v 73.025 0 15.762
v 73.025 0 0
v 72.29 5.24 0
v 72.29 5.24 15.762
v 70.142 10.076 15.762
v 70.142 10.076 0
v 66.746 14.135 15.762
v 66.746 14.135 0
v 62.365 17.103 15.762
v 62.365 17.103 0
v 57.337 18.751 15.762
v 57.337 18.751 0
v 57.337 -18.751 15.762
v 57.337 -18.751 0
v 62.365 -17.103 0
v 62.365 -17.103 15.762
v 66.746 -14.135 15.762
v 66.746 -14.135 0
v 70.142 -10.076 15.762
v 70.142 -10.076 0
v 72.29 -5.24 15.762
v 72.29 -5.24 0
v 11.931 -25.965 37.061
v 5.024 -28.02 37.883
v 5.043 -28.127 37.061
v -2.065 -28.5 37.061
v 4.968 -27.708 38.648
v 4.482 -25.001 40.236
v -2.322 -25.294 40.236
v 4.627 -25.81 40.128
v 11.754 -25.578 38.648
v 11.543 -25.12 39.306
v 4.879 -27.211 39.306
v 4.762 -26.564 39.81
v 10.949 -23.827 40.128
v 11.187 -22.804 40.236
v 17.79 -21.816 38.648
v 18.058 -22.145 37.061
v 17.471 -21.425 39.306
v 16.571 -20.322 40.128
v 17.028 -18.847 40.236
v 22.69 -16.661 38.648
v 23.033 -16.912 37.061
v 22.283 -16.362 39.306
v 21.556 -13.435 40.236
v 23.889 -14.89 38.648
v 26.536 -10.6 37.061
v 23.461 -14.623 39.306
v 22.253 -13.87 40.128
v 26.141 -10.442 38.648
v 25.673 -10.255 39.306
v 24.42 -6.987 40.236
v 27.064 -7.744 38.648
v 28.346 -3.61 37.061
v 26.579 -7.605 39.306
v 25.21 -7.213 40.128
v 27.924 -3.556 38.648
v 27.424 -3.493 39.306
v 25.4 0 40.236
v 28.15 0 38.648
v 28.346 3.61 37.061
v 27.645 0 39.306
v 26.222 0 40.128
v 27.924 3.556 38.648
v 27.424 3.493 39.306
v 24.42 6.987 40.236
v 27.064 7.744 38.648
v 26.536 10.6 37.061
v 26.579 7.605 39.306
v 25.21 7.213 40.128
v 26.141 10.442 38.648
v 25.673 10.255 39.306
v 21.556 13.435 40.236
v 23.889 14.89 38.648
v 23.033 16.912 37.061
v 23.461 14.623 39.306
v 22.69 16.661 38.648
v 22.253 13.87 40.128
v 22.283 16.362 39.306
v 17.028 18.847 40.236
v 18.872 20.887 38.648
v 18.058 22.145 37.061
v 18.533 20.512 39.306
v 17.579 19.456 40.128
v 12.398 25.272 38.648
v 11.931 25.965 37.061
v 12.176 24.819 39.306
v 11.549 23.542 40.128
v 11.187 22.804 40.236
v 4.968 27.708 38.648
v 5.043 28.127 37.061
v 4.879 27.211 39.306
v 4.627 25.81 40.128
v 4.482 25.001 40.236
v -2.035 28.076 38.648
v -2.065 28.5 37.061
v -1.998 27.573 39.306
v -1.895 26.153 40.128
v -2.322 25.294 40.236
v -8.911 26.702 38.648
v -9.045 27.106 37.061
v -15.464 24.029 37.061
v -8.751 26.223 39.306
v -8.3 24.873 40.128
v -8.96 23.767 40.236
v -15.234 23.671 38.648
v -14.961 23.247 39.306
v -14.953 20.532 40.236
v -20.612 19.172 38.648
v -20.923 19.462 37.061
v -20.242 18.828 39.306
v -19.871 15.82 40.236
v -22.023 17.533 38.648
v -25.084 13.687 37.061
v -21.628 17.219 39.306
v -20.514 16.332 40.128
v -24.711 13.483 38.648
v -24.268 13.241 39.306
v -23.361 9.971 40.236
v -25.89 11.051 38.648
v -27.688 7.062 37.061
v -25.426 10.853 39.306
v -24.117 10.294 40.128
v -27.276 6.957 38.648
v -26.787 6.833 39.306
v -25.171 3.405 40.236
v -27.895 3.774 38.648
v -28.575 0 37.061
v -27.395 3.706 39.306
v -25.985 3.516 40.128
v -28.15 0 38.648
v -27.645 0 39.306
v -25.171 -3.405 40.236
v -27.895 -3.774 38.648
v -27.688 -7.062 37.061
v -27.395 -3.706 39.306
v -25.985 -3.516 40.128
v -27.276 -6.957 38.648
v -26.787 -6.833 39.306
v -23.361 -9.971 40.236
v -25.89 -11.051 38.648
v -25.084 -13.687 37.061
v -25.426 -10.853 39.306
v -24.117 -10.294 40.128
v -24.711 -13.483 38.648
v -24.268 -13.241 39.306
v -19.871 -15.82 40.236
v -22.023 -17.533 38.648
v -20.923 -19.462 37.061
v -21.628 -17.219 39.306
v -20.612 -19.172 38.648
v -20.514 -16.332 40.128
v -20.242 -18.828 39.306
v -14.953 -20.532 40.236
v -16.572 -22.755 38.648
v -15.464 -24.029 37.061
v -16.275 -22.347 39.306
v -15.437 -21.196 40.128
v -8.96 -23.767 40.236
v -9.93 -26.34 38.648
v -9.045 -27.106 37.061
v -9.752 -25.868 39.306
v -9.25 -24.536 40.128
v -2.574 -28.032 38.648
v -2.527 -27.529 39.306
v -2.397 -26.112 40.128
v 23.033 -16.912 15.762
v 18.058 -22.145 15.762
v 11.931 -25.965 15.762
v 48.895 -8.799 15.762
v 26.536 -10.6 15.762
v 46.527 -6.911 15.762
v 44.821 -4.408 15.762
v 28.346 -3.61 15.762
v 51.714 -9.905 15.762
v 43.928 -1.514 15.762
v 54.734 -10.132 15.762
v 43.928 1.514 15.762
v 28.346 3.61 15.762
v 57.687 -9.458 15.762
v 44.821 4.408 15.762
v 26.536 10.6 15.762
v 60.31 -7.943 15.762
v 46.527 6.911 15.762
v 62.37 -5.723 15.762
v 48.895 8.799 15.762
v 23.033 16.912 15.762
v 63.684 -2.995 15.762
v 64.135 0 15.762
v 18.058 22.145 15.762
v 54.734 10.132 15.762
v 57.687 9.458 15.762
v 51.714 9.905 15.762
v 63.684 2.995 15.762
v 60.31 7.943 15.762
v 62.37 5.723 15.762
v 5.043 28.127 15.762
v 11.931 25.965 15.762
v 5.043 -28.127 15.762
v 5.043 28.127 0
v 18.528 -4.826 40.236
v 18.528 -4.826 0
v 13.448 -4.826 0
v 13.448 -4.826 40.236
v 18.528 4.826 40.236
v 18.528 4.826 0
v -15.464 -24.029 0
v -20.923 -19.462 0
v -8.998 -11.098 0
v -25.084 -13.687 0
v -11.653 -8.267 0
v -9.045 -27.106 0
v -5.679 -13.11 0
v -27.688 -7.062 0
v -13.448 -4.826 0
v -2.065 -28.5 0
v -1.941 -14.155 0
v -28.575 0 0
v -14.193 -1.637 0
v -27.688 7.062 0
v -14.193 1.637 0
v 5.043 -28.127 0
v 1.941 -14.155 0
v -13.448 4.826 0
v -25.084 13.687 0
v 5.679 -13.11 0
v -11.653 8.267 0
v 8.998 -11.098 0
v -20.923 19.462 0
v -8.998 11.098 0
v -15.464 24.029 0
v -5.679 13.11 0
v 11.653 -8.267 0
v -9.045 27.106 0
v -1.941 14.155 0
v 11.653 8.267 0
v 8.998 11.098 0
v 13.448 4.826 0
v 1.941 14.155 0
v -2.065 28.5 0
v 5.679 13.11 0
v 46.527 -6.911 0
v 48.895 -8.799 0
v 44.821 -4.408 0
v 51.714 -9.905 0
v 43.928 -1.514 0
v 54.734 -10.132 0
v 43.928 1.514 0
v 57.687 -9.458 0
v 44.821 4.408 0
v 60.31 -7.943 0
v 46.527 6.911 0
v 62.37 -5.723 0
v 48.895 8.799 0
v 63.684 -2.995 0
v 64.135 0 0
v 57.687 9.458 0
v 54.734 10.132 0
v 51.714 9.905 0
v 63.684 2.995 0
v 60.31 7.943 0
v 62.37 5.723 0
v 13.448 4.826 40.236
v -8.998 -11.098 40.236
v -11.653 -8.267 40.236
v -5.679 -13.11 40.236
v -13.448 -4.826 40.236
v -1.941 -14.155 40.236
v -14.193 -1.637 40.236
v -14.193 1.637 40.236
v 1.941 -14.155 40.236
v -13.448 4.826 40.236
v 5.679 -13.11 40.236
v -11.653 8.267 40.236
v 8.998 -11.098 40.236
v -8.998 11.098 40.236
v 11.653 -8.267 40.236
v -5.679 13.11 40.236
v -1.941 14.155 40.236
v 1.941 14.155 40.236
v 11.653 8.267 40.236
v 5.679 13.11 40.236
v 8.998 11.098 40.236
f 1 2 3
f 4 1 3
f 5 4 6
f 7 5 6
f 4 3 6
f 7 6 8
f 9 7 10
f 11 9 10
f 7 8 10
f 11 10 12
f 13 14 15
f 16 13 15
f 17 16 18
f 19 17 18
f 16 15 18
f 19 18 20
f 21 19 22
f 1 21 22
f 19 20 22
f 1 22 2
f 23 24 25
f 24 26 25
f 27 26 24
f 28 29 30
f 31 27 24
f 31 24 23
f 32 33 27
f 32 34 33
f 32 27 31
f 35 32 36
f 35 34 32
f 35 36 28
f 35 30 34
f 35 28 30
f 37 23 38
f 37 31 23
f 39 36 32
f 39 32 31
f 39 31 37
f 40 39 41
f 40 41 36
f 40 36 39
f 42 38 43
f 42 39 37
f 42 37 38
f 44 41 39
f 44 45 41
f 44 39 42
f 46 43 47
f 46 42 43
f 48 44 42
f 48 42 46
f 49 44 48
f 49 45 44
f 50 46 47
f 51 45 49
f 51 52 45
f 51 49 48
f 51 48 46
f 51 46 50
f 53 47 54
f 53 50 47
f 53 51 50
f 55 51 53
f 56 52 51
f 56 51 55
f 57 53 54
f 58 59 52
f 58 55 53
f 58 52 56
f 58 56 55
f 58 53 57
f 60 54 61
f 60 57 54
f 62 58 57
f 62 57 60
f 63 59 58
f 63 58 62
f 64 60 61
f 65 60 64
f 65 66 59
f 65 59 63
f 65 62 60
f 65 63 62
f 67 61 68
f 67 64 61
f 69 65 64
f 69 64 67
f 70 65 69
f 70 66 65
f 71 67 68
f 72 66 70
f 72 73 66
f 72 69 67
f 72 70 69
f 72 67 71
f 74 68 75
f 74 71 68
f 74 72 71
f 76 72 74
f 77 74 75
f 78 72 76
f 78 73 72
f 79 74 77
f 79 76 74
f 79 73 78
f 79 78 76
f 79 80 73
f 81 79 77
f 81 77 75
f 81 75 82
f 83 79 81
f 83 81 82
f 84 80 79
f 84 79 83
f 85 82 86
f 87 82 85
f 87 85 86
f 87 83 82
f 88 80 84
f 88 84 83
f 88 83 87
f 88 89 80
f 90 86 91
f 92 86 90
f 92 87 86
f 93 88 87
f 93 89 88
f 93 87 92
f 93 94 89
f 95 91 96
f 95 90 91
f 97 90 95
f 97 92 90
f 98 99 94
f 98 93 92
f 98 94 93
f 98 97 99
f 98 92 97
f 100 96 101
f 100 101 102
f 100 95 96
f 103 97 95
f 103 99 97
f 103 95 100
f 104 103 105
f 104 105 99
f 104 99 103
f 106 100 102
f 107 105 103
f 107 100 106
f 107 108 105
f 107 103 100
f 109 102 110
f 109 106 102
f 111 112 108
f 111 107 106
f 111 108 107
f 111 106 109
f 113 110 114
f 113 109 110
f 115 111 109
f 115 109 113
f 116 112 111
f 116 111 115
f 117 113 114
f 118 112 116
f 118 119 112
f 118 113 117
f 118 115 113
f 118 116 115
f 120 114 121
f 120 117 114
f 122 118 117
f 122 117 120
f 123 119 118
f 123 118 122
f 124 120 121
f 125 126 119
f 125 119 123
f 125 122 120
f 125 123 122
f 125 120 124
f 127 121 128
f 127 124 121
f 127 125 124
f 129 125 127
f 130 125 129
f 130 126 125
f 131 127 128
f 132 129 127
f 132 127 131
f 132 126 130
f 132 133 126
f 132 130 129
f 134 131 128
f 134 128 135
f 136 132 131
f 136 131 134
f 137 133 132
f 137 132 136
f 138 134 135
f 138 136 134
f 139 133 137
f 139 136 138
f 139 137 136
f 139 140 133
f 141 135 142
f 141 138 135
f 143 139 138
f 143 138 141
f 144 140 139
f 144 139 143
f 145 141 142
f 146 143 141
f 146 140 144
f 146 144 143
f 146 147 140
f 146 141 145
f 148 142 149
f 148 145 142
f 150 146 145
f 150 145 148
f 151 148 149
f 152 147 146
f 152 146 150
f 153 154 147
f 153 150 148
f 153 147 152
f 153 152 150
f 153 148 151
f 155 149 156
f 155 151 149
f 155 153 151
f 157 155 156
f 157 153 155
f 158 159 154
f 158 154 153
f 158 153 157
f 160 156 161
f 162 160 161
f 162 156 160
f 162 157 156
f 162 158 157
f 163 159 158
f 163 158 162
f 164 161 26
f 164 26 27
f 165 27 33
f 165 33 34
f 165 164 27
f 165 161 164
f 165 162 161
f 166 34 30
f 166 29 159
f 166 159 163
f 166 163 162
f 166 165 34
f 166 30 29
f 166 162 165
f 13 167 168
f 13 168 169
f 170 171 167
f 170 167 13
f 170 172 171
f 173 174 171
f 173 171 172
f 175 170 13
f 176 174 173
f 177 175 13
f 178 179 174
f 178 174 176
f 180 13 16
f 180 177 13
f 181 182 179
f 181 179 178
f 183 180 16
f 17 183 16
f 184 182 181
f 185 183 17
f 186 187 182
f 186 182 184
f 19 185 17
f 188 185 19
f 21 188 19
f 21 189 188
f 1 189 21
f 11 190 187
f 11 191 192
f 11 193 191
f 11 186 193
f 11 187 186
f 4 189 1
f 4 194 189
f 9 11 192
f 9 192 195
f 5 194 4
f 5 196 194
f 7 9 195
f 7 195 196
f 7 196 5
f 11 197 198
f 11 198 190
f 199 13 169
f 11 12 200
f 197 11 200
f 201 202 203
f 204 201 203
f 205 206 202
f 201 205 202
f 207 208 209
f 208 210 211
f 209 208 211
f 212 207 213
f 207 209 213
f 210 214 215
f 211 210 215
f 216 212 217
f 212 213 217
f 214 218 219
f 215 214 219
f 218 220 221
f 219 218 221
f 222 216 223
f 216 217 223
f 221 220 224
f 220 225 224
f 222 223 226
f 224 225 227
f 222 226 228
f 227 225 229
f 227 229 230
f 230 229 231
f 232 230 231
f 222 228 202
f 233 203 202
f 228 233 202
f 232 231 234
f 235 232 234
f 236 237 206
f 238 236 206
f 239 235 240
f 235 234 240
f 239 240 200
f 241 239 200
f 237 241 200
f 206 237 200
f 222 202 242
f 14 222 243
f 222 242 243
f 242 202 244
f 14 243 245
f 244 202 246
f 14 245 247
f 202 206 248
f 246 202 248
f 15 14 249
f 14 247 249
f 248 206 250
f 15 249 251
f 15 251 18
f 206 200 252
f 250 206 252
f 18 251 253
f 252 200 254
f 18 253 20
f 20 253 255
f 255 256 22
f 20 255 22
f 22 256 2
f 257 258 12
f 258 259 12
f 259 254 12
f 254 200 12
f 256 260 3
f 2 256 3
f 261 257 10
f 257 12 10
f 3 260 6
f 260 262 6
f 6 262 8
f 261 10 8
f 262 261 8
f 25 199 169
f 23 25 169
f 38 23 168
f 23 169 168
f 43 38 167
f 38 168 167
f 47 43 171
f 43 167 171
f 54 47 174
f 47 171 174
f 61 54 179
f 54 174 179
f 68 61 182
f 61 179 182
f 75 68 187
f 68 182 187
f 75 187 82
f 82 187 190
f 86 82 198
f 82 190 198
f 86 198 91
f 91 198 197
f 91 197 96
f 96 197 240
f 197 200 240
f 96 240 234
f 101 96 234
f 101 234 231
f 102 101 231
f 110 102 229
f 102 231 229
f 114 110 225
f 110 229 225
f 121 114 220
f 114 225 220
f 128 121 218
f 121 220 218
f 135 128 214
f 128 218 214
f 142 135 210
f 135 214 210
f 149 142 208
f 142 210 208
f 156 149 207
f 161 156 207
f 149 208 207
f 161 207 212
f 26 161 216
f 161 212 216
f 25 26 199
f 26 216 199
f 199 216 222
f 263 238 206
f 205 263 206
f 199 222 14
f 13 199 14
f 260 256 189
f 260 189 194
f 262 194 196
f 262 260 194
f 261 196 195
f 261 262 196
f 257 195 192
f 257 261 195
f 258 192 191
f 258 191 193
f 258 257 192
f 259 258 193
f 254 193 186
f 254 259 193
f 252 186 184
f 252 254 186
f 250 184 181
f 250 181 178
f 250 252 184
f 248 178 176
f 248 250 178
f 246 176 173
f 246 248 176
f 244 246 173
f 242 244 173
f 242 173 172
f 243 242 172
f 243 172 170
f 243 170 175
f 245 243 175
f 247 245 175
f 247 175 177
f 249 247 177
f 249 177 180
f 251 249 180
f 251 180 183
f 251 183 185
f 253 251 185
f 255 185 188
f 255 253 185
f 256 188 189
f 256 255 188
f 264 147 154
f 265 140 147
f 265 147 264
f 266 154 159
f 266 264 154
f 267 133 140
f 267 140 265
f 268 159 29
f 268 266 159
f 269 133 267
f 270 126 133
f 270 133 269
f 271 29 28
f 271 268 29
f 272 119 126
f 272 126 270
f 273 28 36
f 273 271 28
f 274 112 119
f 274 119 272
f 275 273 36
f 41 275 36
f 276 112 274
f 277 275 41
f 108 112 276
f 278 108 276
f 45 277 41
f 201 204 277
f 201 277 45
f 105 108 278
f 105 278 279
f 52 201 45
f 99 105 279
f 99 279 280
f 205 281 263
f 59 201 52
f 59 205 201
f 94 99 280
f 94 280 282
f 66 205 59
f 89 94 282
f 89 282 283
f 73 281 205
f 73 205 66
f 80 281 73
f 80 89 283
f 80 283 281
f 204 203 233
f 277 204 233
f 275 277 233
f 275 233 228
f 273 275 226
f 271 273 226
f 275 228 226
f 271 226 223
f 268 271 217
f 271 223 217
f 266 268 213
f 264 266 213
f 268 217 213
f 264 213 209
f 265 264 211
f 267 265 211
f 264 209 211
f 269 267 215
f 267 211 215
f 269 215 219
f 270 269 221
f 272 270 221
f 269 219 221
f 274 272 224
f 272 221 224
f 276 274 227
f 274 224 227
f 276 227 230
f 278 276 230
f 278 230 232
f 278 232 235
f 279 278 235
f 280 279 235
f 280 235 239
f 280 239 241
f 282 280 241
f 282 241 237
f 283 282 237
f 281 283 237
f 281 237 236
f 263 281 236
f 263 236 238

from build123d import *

# Parameters (mm, degrees)
F0_R     = 10.16
F1_DEPTH = 15.76169
F2_DEPTH = 40.2358
F3_R     = 3.175


# Not quite as in the source:
# - a feature names something its author has since deleted; it is built from what else it names


with BuildPart() as f1:
    # F0 (on Top) → F1 (new body)
    with BuildSketch(Plane.XY):
        with BuildLine():
            ThreePointArc((5.0426470588, -28.1265414802), (21.9160245563, -18.3362616868), (28.575, 0))
            ThreePointArc((28.575, 0), (21.9160245563, 18.3362616868), (5.0426470588, 28.1265414802))
            ThreePointArc((5.0426470588, 28.1265414802), (-28.575, 0), (5.0426470588, -28.1265414802))
        make_face()
        with BuildLine():
            ThreePointArc((-13.4477648793, 4.826), (0, 14.2875), (13.4477648793, 4.826))
            Line((13.4477648793, 4.826), (18.5277648793, 4.826))
            Line((18.5277648793, 4.826), (18.5277648793, -4.826))
            Line((18.5277648793, -4.826), (13.4477648793, -4.826))
            ThreePointArc((13.4477648793, -4.826), (0, -14.2875), (-13.4477648793, -4.826))
            Line((-13.4477648793, -4.826), (-18.5277648793, -4.826))
            Line((-18.5277648793, -4.826), (-18.5277648793, 4.826))
            Line((-18.5277648793, 4.826), (-13.4477648793, 4.826))
        make_face(mode=Mode.SUBTRACT)
        with BuildLine():
            ThreePointArc((5.0426470588, 28.1265414802), (21.9160245563, 18.3362616868), (28.575, 0))
            ThreePointArc((28.575, 0), (21.9160245563, -18.3362616868), (5.0426470588, -28.1265414802))
            Line((5.0426470588, -28.1265414802), (57.3367647059, -18.7510276535))
            ThreePointArc((57.3367647059, -18.7510276535), (34.925, 0), (57.3367647059, 18.7510276535))
            Line((57.3367647059, 18.7510276535), (5.0426470588, 28.1265414802))
        make_face()
        with BuildLine():
            ThreePointArc((-13.4477648793, -4.826), (-14.2875, 0), (-13.4477648793, 4.826))
            Line((-13.4477648793, 4.826), (-18.5277648793, 4.826))
            Line((-18.5277648793, 4.826), (-18.5277648793, -4.826))
            Line((-18.5277648793, -4.826), (-13.4477648793, -4.826))
        make_face()
        with BuildLine():
            ThreePointArc((73.025, 0), (68.5856830375, 12.2241744579), (57.3367647059, 18.7510276535))
            ThreePointArc((57.3367647059, 18.7510276535), (34.925, 0), (57.3367647059, -18.7510276535))
            ThreePointArc((57.3367647059, -18.7510276535), (68.5856830375, -12.2241744579), (73.025, 0))
        make_face()
        with Locations((53.975, 0)):
            Circle(F0_R, mode=Mode.SUBTRACT)
    extrude(amount=F1_DEPTH)

    # F0 (on Top) → F2 (join)
    with BuildSketch(Plane.XY):
        with BuildLine():
            ThreePointArc((5.0426470588, -28.1265414802), (21.9160245563, -18.3362616868), (28.575, 0))
            ThreePointArc((28.575, 0), (21.9160245563, 18.3362616868), (5.0426470588, 28.1265414802))
            ThreePointArc((5.0426470588, 28.1265414802), (-28.575, 0), (5.0426470588, -28.1265414802))
        make_face()
        with BuildLine():
            ThreePointArc((-13.4477648793, 4.826), (0, 14.2875), (13.4477648793, 4.826))
            Line((13.4477648793, 4.826), (18.5277648793, 4.826))
            Line((18.5277648793, 4.826), (18.5277648793, -4.826))
            Line((18.5277648793, -4.826), (13.4477648793, -4.826))
            ThreePointArc((13.4477648793, -4.826), (0, -14.2875), (-13.4477648793, -4.826))
            Line((-13.4477648793, -4.826), (-18.5277648793, -4.826))
            Line((-18.5277648793, -4.826), (-18.5277648793, 4.826))
            Line((-18.5277648793, 4.826), (-13.4477648793, 4.826))
        make_face(mode=Mode.SUBTRACT)
        with BuildLine():
            ThreePointArc((-13.4477648793, -4.826), (-14.2875, 0), (-13.4477648793, 4.826))
            Line((-13.4477648793, 4.826), (-18.5277648793, 4.826))
            Line((-18.5277648793, 4.826), (-18.5277648793, -4.826))
            Line((-18.5277648793, -4.826), (-13.4477648793, -4.826))
        make_face()
    extrude(amount=F2_DEPTH)

    # F3
    f3_edges = [f1.edges().sort_by_distance(p)[0] for p in [
        (-5.042647, 28.126541, 40.2358),
    ]]
    fillet(f3_edges, radius=F3_R)


solid = f1.part
